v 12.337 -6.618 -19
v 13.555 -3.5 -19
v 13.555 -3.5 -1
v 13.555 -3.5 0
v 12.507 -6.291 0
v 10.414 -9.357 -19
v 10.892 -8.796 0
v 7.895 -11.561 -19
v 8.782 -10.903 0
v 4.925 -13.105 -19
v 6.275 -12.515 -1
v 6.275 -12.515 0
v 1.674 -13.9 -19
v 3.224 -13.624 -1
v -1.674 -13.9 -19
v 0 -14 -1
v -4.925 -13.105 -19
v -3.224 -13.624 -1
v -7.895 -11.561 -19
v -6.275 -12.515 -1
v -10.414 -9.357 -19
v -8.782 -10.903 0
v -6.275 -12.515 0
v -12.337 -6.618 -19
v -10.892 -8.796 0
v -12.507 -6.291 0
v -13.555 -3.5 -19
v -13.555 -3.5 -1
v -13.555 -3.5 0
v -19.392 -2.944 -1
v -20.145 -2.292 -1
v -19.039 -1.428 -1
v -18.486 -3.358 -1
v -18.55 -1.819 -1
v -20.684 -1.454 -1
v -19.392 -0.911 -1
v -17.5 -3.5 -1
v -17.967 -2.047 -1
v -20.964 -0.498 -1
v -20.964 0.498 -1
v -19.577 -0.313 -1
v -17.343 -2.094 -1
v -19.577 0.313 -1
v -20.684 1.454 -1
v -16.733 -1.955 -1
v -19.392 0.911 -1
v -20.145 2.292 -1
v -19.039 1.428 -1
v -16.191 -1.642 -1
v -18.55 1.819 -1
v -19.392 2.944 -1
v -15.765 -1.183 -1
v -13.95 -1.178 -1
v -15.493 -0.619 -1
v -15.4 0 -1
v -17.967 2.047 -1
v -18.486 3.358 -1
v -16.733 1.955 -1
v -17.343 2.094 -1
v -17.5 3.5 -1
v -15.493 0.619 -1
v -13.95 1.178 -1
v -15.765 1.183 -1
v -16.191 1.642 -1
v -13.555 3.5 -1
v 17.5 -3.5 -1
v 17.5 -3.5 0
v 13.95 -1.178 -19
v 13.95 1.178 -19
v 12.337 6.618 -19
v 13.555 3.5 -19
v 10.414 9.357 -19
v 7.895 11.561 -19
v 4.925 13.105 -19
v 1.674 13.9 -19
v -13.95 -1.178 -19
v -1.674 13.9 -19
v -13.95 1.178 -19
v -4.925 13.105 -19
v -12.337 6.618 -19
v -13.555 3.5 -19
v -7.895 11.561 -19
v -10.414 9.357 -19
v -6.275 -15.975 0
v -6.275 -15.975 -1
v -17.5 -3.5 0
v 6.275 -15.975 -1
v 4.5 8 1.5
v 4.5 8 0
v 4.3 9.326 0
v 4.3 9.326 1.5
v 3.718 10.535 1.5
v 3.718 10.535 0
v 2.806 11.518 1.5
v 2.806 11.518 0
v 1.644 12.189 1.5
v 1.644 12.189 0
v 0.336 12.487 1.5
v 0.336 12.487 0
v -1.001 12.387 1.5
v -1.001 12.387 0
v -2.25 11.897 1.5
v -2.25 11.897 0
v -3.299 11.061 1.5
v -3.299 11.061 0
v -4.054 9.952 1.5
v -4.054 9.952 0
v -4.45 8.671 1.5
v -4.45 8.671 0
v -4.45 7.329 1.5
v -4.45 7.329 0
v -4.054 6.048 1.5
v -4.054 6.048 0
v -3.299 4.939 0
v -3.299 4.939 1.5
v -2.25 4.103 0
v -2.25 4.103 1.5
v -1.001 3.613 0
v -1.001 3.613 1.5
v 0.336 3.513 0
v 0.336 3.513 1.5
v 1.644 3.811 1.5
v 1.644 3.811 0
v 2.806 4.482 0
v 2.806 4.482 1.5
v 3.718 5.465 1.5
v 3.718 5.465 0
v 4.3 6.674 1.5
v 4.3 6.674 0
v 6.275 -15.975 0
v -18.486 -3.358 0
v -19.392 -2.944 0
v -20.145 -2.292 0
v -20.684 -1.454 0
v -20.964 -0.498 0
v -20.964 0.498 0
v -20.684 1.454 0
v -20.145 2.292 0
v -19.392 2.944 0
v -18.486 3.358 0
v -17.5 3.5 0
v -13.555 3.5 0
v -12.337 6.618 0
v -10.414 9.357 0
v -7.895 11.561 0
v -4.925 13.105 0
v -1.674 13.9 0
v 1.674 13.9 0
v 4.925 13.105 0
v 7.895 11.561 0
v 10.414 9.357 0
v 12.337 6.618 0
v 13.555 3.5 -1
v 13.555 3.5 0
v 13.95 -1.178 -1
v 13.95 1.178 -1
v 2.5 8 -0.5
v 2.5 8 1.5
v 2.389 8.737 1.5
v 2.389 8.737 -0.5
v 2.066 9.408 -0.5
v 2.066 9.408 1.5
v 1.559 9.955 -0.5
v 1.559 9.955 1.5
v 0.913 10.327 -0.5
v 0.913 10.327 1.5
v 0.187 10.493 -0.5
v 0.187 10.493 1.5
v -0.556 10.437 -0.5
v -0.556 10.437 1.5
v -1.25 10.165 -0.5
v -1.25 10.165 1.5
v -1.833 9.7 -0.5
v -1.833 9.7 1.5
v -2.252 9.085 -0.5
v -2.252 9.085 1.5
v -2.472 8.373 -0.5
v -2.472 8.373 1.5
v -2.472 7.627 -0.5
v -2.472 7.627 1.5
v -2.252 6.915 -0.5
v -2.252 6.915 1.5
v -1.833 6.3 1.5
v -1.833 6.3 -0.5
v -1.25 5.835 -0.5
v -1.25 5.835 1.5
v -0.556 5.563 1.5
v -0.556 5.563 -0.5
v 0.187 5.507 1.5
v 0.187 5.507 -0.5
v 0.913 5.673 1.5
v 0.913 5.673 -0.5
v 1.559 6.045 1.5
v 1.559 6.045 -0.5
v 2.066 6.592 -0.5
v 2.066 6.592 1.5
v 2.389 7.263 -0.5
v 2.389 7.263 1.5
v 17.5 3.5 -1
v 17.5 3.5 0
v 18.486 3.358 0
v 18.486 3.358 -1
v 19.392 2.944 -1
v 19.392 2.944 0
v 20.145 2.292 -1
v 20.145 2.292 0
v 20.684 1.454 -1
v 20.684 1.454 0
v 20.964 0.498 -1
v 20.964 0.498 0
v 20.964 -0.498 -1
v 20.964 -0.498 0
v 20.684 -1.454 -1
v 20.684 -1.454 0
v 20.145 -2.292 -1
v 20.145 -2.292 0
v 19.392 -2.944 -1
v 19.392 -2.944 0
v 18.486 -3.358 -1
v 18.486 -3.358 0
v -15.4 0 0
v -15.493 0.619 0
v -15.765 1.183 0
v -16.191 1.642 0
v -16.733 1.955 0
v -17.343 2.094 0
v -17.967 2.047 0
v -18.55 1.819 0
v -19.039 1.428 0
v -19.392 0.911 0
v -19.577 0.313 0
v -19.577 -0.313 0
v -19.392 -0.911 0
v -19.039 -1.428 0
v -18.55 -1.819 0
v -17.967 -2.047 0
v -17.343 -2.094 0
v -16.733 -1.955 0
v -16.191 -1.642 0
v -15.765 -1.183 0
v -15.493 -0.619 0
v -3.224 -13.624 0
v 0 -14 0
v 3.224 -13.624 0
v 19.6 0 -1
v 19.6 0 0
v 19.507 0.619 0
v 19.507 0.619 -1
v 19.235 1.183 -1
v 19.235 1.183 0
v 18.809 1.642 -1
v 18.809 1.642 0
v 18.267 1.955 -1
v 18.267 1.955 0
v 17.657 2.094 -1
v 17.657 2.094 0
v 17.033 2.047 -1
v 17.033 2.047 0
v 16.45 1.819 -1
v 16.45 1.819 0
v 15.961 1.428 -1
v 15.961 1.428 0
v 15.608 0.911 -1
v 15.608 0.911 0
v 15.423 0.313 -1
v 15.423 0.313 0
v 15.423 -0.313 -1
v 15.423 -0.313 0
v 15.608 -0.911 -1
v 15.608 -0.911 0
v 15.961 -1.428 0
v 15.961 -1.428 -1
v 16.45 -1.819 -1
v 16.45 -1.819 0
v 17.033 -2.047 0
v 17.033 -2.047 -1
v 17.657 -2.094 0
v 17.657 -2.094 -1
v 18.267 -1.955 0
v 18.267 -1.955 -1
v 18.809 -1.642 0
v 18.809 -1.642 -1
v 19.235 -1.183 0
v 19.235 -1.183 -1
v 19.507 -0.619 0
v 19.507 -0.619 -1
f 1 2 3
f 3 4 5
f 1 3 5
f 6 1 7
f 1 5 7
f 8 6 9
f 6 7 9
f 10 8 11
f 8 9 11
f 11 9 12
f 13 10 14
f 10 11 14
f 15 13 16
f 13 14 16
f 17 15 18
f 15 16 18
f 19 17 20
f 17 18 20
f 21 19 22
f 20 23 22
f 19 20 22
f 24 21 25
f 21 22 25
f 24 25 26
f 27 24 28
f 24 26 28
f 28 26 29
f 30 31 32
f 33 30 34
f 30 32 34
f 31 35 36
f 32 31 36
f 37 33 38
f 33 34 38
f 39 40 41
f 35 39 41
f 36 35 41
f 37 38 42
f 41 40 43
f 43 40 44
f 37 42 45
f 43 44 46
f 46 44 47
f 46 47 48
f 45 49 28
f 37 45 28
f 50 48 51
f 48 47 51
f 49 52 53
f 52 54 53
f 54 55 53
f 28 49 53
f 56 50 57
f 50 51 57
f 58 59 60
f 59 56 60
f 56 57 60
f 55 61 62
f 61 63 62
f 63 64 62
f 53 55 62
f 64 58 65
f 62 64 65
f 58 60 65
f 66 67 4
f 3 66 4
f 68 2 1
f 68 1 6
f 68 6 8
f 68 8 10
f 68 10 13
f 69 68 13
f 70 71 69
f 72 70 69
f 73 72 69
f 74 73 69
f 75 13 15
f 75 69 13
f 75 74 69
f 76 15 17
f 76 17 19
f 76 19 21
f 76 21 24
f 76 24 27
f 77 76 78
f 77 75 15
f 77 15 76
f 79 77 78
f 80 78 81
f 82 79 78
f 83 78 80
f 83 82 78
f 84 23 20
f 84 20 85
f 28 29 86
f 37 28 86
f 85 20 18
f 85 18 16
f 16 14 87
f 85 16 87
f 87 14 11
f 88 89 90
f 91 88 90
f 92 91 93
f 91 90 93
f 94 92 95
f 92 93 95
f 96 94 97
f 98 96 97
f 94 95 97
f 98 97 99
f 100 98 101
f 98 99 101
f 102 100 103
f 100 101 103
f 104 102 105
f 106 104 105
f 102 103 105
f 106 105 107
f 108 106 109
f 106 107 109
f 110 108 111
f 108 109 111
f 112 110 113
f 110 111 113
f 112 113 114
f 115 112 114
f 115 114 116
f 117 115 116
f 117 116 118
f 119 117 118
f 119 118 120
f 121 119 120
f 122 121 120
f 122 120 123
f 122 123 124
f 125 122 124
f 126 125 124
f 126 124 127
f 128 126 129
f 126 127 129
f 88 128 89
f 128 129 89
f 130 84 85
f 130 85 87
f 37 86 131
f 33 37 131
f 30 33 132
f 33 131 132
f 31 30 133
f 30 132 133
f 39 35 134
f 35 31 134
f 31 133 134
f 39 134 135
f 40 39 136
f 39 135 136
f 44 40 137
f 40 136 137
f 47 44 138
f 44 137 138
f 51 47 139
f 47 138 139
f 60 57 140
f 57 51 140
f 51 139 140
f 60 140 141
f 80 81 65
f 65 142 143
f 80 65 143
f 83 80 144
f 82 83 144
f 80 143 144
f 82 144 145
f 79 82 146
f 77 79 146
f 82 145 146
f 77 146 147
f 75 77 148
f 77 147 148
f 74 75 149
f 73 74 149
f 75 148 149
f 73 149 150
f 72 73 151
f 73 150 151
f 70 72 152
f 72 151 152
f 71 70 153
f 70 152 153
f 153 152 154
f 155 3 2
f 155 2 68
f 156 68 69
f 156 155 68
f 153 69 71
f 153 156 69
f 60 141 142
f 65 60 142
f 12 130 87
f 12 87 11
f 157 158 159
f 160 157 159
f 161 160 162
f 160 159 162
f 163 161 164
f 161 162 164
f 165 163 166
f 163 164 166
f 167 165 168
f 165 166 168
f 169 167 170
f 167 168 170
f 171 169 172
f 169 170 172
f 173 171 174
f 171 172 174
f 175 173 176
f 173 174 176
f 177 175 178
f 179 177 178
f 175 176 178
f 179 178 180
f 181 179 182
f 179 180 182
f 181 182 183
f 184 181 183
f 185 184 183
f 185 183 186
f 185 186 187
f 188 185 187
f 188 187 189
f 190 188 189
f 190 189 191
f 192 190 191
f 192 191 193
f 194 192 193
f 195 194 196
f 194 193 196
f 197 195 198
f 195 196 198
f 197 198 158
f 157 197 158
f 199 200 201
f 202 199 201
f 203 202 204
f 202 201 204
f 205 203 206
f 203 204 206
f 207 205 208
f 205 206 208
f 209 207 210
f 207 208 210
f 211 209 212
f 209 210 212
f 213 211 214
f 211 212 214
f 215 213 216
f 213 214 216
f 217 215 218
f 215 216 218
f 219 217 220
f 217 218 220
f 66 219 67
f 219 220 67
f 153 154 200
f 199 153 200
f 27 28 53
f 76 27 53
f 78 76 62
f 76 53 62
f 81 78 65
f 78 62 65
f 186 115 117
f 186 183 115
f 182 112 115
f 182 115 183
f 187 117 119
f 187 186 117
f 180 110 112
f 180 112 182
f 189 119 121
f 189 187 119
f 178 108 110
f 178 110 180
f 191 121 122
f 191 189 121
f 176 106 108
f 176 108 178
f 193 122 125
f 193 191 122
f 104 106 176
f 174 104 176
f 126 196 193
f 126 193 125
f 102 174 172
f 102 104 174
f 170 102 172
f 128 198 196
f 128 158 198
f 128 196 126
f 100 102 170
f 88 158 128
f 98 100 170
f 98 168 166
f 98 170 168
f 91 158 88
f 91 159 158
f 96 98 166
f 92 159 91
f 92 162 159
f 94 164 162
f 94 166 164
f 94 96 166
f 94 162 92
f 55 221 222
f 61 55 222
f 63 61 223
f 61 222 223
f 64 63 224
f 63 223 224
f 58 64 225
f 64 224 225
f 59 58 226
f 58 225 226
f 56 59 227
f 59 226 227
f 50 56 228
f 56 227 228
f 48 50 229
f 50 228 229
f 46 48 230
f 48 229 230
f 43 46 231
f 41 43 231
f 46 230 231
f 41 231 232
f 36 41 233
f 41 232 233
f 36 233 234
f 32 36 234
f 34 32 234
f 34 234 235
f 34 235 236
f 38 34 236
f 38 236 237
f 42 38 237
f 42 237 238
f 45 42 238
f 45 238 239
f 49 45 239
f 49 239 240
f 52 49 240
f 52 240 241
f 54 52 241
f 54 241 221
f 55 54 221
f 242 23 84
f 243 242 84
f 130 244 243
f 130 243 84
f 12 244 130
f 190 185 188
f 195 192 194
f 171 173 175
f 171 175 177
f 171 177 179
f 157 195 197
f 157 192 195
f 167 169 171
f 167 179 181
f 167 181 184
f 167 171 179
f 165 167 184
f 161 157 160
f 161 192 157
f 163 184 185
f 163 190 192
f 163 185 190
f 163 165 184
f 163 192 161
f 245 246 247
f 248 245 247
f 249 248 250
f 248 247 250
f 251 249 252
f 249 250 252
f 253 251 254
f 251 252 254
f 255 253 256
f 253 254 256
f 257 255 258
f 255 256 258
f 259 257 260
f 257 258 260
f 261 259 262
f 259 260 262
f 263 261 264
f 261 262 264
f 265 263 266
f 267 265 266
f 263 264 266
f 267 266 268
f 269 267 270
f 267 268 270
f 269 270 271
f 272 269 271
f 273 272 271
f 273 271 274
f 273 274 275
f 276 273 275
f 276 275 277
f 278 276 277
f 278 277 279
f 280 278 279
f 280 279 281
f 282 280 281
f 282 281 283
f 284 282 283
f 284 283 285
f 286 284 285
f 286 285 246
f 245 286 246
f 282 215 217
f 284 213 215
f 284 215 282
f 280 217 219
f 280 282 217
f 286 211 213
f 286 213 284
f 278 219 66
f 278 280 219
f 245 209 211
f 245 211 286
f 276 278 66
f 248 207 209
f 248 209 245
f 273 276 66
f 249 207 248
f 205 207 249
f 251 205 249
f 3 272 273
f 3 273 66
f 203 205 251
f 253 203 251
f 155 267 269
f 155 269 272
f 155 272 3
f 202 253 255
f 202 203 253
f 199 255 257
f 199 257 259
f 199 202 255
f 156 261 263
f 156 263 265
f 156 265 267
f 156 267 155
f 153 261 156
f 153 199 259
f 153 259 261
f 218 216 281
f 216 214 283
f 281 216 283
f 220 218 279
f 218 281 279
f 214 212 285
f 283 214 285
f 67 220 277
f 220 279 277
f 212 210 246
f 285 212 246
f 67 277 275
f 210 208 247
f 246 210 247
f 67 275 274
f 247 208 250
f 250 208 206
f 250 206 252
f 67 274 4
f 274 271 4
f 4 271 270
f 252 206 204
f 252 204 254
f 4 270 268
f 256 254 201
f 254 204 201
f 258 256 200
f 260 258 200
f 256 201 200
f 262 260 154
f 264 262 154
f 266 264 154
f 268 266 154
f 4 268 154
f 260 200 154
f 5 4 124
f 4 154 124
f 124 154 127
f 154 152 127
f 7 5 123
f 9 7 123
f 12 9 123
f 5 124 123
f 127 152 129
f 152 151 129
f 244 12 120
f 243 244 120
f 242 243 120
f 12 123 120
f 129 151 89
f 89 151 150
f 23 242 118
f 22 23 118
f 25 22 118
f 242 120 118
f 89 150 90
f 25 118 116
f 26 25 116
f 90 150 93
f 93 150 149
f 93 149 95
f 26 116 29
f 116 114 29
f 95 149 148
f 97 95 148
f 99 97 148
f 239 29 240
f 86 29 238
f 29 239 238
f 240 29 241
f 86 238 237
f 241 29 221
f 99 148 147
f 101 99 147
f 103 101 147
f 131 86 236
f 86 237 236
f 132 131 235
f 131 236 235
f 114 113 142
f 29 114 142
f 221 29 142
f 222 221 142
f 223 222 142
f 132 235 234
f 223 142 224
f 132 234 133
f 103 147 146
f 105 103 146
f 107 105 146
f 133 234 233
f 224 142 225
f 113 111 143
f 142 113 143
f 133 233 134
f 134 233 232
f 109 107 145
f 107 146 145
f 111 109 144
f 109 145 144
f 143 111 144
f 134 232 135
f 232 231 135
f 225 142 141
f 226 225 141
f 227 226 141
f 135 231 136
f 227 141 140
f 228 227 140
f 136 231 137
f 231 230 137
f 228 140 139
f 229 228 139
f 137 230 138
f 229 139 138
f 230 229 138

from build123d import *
from build123d.topology import SkipClean

# Parameters (mm, degrees)
ESQUISSE1_R             = 2.1
BOSS_EXTRU_1_DEPTH      = 19
ENL_V_START             = -18
ENL_V_MAT_EXTRU_1_DEPTH = 18
ESQUISSE3_R             = 4.5
BOSS_EXTRU_2_DEPTH      = 1.5
ESQUISSE4_R             = 2.5
ENL_V_MAT_EXTRU_2_DEPTH = 2
BOSS_EXTRU_3_DEPTH      = 1


with BuildPart() as part:
    # Esquisse1 → Boss.-Extru.1 (new body)
    with BuildSketch(Plane.XY):
        with BuildLine():
            Line((13.555441712, 3.5), (17.5, 3.5))
            ThreePointArc((17.5, 3.5), (21, 0), (17.5, -3.5))
            Line((17.5, -3.5), (13.555441712, -3.5))
            ThreePointArc((13.555441712, -3.5), (0, -14), (-13.555441712, -3.5))
            Line((-13.555441712, -3.5), (-17.5, -3.5))
            ThreePointArc((-17.5, -3.5), (-21, 0), (-17.5, 3.5))
            Line((-17.5, 3.5), (-13.555441712, 3.5))
            ThreePointArc((-13.555441712, 3.5), (0, 14), (13.555441712, 3.5))
        make_face()
        with Locations((-17.5, 0)):
            Circle(ESQUISSE1_R, mode=Mode.SUBTRACT)
        with Locations((17.5, 0)):
            Circle(ESQUISSE1_R, mode=Mode.SUBTRACT)
    extrude(amount=-BOSS_EXTRU_1_DEPTH)

    # Esquisse2 → Enlèv. mat.-Extru.1 (cut)
    with SkipClean():  # the faces are left unmerged after this step: merging them gives an invalid solid
        with BuildSketch(Plane(origin=(0, 0, -19), x_dir=(-1, 0, 0), z_dir=(0, 0, -1)).offset(ENL_V_START)):
            with BuildLine():
                Line((-13.555441712, 3.5), (-17.5, 3.5))
                ThreePointArc((-17.5, 3.5), (-21, 0), (-17.5, -3.5))
                Line((-17.5, -3.5), (-13.555441712, -3.5))
                ThreePointArc((-13.555441712, -3.5), (-14, 0), (-13.555441712, 3.5))
            make_face()
            with BuildLine():
                Line((13.555441712, 3.5), (17.5, 3.5))
                ThreePointArc((17.5, 3.5), (21, 0), (17.5, -3.5))
                Line((17.5, -3.5), (13.555441712, -3.5))
                ThreePointArc((13.555441712, -3.5), (14, 0), (13.555441712, 3.5))
            make_face()
        extrude(amount=ENL_V_MAT_EXTRU_1_DEPTH, mode=Mode.SUBTRACT)

    # Esquisse3 → Boss.-Extru.2 (add)
    with SkipClean():  # the faces are left unmerged after this step: merging them gives an invalid solid
        with BuildSketch(Plane.XY):
            with Locations((0, 8)):
                Circle(ESQUISSE3_R)
        extrude(amount=BOSS_EXTRU_2_DEPTH)

    # Esquisse4 → Enlèv. mat.-Extru.2 (cut)
    with SkipClean():  # the faces are left unmerged after this step: merging them gives an invalid solid
        with BuildSketch(Plane.XY.offset(1.5)):
            with Locations((0, 8)):
                Circle(ESQUISSE4_R)
        extrude(amount=-ENL_V_MAT_EXTRU_2_DEPTH, mode=Mode.SUBTRACT)

    # Esquisse5 → Boss.-Extru.3 (add)
    with SkipClean():  # the faces are left unmerged after this step: merging them gives an invalid solid
        with BuildSketch(Plane.XY):
            with BuildLine():
                Line((-6.275, -15.975), (6.275, -15.975))
                Line((6.275, -15.975), (6.275, -12.514966041))
                ThreePointArc((6.275, -12.514966041), (0, -14), (-6.275, -12.514966041))
                Line((-6.275, -12.514966041), (-6.275, -15.975))
            make_face()
        extrude(amount=-BOSS_EXTRU_3_DEPTH)


solid = part.part
